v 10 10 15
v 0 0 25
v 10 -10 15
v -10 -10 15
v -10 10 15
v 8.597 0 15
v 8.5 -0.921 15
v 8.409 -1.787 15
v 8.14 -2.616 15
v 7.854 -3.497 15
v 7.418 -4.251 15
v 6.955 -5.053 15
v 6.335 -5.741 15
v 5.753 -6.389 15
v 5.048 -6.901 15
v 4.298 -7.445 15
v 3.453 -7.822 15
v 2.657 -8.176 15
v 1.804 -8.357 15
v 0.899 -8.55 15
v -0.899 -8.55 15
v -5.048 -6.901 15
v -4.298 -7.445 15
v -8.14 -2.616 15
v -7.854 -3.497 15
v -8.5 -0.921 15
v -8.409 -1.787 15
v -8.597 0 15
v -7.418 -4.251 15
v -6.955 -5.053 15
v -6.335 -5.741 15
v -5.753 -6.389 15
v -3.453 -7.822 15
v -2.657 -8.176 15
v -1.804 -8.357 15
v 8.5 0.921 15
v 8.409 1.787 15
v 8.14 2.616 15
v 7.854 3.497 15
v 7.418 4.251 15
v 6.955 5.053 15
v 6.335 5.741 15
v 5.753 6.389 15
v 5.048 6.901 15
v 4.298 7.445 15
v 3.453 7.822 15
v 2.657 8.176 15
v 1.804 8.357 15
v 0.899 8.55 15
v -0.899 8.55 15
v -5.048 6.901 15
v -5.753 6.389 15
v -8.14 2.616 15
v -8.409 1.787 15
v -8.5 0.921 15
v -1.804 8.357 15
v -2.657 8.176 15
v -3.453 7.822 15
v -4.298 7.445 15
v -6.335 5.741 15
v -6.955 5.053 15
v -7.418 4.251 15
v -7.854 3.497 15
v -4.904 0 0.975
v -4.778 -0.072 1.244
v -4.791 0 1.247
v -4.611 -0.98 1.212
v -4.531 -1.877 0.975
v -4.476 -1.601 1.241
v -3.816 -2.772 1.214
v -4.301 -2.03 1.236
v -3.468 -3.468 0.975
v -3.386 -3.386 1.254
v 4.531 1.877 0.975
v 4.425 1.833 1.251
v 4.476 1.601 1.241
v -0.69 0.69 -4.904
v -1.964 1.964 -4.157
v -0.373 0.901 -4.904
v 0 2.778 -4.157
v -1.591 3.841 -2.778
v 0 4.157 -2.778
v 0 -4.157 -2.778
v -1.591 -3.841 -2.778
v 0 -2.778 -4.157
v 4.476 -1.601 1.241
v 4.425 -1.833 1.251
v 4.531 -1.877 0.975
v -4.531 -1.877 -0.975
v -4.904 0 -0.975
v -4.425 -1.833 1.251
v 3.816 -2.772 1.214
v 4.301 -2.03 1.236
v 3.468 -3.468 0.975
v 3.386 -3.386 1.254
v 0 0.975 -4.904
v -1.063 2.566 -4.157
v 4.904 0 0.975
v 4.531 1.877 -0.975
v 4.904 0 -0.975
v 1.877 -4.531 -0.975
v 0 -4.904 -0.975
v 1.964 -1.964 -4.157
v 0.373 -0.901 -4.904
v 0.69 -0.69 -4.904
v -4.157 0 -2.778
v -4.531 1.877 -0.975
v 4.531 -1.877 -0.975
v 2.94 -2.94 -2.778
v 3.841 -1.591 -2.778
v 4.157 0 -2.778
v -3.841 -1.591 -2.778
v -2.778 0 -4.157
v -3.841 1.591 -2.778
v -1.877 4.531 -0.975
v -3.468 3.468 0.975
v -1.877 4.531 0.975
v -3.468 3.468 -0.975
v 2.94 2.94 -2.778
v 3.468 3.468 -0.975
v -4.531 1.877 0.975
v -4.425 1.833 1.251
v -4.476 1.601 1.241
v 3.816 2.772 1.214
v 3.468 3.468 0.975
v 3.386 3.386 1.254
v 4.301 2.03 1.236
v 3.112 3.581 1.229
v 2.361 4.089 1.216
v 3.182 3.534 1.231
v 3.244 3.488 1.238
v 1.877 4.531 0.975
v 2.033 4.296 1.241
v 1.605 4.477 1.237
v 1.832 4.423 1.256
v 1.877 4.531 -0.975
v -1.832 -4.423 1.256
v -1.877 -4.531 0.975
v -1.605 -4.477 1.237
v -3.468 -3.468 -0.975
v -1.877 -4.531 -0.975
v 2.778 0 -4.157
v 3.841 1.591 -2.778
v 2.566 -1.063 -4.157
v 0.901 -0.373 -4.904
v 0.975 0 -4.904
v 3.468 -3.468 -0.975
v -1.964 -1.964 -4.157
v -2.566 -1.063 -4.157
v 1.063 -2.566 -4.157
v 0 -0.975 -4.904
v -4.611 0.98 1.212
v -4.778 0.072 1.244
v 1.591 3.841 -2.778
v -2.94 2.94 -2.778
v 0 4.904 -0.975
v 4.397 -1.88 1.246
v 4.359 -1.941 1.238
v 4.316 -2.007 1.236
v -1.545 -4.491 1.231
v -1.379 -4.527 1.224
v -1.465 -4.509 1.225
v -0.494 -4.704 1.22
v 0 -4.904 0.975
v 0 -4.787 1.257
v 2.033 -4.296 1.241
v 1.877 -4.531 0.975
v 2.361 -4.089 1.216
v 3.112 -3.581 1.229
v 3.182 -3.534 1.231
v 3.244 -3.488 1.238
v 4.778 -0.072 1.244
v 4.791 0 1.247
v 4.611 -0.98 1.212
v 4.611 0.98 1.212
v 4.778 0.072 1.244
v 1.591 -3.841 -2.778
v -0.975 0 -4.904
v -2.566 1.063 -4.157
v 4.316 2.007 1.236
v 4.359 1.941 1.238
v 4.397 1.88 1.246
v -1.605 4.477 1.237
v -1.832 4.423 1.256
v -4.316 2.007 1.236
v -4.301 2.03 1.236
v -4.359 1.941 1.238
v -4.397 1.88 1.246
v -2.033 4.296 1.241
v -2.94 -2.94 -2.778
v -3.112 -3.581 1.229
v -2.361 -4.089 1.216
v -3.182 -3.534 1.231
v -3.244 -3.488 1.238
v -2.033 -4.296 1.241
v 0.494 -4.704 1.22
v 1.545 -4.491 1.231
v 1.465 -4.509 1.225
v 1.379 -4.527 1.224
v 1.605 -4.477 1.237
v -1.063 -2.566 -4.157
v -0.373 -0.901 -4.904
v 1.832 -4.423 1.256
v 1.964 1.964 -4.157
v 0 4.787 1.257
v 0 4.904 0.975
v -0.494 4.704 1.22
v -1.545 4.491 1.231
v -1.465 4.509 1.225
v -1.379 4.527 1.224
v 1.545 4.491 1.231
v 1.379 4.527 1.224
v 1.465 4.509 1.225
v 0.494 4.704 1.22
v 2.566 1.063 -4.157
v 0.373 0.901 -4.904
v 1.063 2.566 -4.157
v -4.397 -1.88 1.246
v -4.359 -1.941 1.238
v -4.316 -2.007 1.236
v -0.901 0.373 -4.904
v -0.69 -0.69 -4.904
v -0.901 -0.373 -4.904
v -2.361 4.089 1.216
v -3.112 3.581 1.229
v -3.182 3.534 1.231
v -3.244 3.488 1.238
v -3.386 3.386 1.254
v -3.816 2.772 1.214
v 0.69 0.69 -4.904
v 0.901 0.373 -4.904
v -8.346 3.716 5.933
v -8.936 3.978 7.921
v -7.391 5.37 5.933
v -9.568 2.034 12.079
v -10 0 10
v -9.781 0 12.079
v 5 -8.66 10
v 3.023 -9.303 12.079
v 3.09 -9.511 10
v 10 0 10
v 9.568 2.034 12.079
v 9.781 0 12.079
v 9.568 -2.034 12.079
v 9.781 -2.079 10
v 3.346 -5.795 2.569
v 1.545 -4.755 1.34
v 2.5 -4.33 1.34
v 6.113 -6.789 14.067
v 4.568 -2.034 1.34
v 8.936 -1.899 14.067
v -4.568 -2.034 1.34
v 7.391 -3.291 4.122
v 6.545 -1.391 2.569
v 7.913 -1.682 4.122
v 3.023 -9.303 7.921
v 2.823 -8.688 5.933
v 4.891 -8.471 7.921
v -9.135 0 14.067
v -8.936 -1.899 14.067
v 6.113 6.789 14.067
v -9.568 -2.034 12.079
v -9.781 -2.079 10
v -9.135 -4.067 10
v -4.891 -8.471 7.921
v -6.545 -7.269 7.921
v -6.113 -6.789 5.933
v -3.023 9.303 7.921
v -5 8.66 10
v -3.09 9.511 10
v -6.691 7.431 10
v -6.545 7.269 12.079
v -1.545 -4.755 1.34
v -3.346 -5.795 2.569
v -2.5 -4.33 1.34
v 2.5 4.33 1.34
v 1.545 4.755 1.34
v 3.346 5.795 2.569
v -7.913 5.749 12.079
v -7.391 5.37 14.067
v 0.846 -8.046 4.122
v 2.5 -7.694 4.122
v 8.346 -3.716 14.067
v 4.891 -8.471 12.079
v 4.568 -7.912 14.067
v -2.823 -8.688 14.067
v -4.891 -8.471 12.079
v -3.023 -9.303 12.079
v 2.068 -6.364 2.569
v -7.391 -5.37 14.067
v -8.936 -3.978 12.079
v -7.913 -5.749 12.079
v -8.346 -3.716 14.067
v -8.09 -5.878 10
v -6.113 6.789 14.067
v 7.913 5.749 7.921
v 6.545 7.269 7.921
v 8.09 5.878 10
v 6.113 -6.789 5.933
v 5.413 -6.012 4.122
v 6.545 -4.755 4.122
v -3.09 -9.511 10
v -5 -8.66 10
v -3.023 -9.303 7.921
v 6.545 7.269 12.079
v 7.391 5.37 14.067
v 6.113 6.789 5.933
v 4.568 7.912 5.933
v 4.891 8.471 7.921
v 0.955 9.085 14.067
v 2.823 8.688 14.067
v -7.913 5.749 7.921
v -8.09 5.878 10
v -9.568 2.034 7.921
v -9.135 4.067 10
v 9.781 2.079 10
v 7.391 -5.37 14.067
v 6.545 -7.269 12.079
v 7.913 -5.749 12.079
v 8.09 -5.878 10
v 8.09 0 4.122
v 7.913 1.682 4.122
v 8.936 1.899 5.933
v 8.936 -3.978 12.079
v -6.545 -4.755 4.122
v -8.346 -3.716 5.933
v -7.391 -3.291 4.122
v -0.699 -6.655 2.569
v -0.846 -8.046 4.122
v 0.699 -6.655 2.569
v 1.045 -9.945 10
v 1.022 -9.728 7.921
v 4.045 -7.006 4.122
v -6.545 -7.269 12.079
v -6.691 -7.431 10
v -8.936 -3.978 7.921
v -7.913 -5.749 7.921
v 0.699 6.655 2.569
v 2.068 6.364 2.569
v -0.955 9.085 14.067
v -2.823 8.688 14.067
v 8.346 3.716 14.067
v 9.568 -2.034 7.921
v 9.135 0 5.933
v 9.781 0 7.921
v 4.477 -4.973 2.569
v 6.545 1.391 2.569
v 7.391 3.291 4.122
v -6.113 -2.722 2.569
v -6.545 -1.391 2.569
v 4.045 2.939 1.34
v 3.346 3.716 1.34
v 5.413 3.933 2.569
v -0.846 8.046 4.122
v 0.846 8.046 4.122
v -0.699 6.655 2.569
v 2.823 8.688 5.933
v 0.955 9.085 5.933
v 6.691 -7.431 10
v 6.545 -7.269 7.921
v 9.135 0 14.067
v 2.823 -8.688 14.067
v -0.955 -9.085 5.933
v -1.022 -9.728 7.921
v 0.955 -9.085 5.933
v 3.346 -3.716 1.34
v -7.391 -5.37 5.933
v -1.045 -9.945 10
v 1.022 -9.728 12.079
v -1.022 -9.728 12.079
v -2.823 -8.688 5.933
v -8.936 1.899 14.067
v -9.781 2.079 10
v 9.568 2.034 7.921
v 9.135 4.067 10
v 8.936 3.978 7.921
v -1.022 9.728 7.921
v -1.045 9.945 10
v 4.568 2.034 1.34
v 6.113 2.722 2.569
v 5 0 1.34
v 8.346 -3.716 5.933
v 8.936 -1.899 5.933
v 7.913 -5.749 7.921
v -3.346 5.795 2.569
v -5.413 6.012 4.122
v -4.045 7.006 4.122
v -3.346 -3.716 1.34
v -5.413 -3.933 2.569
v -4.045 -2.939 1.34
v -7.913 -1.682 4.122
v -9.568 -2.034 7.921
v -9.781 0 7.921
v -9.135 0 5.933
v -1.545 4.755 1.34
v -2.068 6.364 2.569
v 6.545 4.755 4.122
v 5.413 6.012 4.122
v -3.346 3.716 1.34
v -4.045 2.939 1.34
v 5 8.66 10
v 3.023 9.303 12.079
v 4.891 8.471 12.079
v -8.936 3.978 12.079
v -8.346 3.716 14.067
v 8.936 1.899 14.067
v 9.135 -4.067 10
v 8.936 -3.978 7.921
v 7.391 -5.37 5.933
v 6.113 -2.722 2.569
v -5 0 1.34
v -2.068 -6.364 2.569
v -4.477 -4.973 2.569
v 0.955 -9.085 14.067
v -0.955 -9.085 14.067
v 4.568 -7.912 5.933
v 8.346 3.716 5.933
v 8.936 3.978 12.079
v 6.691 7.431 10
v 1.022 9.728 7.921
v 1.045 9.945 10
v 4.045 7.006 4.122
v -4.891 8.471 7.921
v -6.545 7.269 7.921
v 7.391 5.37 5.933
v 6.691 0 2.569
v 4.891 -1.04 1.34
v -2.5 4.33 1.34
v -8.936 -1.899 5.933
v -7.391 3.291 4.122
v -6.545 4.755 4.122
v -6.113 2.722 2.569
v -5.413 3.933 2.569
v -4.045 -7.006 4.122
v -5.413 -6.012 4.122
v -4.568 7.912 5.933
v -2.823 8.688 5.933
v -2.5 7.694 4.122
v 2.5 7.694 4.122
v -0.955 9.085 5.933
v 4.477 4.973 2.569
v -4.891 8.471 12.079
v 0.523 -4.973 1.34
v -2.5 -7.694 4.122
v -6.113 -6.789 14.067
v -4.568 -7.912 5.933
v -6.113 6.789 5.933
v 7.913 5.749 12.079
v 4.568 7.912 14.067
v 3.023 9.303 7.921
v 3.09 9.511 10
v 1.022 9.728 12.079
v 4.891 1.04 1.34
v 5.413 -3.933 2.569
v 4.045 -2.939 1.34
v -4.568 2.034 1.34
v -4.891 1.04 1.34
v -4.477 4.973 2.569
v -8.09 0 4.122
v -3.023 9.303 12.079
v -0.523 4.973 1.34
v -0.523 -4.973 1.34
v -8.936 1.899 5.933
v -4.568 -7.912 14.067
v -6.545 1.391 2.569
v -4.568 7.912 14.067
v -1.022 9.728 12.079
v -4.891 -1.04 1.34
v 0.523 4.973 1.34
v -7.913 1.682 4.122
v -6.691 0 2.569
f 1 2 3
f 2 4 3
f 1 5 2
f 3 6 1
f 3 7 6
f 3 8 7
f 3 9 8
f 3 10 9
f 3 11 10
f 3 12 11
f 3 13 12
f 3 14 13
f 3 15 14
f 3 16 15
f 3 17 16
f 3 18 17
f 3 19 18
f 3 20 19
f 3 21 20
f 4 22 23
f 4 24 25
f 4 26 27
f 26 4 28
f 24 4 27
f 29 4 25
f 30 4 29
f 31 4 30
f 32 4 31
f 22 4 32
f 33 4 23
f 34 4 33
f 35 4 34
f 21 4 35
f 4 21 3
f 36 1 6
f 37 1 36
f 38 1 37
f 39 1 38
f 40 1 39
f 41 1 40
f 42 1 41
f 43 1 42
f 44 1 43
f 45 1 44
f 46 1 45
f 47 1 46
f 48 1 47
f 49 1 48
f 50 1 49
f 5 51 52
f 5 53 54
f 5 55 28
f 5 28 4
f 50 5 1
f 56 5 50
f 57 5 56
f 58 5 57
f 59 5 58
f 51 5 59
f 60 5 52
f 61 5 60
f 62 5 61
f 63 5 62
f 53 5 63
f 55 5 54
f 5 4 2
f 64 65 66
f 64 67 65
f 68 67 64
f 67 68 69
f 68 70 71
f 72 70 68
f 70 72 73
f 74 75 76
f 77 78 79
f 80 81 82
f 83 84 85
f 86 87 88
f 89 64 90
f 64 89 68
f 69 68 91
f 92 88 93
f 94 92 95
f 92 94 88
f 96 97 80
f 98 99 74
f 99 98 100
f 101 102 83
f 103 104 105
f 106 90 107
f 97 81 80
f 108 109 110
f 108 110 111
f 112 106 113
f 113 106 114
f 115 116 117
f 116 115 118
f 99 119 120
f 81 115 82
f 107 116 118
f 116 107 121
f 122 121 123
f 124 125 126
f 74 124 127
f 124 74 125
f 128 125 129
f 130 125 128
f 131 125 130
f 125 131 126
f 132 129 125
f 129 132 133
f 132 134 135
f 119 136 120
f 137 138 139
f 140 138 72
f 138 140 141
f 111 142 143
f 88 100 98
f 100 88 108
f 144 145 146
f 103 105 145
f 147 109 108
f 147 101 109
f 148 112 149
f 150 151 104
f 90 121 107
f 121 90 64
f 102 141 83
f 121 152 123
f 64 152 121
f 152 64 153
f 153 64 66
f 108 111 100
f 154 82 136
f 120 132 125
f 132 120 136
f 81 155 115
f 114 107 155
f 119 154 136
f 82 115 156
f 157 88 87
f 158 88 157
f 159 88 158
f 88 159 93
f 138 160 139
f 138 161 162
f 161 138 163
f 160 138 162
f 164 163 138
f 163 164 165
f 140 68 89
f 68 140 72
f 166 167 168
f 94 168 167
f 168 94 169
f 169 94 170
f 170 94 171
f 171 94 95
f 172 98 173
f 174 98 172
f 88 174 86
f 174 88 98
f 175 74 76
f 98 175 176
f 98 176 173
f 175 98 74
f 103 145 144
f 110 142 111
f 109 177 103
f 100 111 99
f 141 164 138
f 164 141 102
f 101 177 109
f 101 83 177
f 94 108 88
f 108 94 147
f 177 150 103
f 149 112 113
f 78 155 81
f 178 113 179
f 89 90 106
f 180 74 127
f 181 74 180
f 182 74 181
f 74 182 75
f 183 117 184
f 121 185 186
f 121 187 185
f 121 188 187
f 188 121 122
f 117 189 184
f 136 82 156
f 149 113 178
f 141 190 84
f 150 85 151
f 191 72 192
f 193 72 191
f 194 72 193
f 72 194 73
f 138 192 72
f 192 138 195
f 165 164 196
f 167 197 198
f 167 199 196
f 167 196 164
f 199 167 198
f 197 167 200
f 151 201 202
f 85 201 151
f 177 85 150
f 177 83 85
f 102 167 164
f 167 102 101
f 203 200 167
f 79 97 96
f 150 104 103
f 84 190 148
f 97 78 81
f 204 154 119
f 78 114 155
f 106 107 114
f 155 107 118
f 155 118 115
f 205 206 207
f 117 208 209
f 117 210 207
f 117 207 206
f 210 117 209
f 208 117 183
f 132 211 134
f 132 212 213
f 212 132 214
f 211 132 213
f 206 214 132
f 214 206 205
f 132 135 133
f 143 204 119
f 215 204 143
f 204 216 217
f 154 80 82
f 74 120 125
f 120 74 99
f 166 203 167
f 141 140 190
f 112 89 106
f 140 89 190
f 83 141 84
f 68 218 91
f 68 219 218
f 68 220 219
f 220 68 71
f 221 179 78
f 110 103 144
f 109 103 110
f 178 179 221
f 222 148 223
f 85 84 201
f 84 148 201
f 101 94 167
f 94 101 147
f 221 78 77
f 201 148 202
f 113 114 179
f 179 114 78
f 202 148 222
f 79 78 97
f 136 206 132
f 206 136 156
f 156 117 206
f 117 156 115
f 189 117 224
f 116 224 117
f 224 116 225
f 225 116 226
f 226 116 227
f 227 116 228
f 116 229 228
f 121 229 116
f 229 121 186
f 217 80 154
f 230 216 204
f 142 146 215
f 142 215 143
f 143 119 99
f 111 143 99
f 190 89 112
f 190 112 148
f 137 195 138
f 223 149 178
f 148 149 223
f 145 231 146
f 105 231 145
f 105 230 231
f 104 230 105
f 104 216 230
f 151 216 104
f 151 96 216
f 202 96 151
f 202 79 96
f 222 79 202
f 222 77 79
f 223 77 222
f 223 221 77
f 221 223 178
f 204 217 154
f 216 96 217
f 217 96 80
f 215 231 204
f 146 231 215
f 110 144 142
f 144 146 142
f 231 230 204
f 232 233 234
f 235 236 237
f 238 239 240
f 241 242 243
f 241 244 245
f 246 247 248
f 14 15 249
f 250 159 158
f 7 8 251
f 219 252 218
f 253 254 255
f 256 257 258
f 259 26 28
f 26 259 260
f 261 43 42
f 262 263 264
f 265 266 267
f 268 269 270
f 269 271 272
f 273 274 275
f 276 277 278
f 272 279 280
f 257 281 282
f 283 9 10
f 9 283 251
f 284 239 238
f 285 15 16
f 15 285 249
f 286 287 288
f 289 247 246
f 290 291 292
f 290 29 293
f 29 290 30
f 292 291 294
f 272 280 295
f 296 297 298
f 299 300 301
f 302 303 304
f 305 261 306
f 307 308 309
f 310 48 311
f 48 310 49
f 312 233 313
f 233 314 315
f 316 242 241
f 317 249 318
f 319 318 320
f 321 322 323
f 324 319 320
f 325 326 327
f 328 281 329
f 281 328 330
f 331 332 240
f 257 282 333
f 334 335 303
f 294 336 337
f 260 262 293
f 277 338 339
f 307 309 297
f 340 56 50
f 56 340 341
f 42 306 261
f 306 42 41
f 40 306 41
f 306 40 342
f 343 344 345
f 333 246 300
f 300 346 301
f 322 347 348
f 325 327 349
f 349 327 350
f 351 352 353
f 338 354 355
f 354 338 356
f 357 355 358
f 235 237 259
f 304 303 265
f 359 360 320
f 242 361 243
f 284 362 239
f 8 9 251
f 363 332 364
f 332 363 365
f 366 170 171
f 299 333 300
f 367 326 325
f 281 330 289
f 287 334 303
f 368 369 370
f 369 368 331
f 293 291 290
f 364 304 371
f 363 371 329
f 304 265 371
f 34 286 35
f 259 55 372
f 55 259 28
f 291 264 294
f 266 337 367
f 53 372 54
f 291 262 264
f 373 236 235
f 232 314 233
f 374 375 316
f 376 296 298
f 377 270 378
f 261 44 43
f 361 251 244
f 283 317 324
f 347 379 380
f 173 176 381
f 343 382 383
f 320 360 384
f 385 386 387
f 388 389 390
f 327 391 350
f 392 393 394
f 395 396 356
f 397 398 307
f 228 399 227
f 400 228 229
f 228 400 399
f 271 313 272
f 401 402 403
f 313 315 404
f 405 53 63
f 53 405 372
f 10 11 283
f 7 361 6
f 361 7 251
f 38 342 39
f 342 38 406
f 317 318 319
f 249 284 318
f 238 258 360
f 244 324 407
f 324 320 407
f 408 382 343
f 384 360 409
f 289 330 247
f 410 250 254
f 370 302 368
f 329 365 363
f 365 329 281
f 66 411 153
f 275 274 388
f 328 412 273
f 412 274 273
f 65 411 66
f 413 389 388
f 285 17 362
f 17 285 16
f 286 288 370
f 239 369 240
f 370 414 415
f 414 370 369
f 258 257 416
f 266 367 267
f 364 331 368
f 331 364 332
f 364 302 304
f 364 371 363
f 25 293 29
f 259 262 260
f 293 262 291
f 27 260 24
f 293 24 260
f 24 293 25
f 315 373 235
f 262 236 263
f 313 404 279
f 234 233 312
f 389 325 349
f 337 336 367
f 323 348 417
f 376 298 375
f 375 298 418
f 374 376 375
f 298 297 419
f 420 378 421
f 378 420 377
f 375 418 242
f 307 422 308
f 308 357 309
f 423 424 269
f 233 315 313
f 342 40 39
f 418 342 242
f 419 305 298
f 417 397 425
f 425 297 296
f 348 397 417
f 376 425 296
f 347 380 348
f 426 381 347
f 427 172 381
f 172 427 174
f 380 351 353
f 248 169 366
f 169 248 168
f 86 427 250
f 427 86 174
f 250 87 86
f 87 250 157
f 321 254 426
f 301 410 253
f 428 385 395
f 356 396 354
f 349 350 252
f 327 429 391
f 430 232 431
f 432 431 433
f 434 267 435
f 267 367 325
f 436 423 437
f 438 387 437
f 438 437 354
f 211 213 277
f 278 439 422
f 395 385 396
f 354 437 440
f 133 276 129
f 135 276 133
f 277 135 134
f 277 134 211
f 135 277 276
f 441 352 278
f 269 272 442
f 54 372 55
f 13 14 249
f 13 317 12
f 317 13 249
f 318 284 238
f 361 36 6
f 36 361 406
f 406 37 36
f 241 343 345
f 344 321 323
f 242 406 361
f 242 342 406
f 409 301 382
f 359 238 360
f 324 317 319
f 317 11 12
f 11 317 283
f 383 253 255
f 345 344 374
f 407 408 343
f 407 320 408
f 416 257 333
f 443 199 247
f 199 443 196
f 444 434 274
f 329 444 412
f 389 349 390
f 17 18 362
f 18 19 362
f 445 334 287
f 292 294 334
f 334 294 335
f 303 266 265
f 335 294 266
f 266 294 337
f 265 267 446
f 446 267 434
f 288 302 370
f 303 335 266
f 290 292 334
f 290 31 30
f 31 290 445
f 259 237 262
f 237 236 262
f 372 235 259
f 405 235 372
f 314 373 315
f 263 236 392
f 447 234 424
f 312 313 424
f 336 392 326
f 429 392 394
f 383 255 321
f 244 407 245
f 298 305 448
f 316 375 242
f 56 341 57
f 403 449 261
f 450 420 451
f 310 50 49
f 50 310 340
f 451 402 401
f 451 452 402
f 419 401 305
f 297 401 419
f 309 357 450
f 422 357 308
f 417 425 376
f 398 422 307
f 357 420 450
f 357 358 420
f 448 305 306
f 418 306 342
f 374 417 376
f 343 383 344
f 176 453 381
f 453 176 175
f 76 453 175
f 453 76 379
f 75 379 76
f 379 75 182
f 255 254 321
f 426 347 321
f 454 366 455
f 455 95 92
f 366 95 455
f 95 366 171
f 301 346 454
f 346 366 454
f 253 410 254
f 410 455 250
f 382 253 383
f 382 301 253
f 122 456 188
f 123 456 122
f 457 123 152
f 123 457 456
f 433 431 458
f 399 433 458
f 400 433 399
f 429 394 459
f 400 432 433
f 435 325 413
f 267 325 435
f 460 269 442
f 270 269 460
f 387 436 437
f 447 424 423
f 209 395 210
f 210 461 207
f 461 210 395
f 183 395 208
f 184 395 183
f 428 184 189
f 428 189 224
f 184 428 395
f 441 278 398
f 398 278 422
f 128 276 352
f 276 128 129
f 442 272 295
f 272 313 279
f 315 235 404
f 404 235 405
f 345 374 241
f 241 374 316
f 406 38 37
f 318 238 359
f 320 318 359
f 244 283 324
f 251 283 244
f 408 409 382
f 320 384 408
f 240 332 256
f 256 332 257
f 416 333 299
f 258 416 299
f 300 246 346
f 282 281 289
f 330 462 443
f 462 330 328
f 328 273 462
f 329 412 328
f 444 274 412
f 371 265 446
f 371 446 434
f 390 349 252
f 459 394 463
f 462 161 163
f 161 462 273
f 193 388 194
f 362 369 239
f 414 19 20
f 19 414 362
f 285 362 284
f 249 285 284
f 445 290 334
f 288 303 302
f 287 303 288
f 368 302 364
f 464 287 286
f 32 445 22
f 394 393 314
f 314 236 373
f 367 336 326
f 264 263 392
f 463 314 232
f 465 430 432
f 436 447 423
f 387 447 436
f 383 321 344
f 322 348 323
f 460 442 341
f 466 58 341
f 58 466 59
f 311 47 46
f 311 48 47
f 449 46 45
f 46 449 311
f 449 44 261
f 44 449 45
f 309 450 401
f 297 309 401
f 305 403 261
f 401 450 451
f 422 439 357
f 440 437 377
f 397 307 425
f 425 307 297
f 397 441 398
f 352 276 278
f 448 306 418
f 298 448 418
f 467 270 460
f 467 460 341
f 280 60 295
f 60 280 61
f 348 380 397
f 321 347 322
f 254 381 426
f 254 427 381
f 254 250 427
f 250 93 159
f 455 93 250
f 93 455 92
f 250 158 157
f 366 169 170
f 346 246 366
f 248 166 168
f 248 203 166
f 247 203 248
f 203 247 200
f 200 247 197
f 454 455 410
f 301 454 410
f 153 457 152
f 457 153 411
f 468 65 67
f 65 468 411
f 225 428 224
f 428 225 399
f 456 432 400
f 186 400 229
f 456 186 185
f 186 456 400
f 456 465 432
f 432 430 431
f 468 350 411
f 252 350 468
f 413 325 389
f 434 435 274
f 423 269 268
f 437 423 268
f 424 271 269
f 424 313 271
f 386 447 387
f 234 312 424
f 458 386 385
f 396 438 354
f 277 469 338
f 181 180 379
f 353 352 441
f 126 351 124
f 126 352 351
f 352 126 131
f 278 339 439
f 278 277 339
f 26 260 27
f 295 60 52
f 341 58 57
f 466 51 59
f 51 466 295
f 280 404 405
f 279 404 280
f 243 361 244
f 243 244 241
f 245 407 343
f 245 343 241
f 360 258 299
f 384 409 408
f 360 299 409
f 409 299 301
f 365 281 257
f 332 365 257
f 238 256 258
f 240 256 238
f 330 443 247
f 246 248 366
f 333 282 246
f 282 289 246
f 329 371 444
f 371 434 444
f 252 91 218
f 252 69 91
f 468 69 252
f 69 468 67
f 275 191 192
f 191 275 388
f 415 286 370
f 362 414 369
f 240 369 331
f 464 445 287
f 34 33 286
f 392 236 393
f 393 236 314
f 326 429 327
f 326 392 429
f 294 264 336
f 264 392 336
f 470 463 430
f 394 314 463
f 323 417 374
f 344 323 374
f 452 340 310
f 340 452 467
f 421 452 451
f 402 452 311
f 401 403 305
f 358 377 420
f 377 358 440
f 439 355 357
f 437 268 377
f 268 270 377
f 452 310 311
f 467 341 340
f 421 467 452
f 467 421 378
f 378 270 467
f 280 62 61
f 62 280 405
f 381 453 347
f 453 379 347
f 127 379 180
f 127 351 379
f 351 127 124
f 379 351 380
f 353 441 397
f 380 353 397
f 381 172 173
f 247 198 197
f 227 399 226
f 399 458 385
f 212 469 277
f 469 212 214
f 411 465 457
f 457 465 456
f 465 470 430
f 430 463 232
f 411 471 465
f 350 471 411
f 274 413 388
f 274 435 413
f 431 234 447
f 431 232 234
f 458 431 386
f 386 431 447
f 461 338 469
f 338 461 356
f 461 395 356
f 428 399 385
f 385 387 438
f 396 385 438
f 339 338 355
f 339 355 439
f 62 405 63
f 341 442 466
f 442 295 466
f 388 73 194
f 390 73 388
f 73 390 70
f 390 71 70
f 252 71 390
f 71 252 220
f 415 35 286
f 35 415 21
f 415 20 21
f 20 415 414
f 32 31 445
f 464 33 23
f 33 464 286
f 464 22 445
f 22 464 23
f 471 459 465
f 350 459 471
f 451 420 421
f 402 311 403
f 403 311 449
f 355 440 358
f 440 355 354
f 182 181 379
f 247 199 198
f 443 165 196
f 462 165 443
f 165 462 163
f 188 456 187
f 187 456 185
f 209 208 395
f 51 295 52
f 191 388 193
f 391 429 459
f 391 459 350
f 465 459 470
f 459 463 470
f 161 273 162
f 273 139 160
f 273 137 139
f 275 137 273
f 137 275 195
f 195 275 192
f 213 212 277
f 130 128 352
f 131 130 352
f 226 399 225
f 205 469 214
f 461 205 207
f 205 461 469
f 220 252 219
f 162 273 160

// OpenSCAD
union(){
translate([0,0,15])polyhedron(
  points=[ [10,10,0],[10,-10,0],[-10,-10,0],[-10,10,0], 
           [0,0,10]  ],                                 
  triangles=[ [0,1,4],[1,2,4],[2,3,4],[3,0,4],             
              [1,0,3],[2,1,3] ]                        
 );
sphere(5);
translate([0,0,10])sphere(10);
}
